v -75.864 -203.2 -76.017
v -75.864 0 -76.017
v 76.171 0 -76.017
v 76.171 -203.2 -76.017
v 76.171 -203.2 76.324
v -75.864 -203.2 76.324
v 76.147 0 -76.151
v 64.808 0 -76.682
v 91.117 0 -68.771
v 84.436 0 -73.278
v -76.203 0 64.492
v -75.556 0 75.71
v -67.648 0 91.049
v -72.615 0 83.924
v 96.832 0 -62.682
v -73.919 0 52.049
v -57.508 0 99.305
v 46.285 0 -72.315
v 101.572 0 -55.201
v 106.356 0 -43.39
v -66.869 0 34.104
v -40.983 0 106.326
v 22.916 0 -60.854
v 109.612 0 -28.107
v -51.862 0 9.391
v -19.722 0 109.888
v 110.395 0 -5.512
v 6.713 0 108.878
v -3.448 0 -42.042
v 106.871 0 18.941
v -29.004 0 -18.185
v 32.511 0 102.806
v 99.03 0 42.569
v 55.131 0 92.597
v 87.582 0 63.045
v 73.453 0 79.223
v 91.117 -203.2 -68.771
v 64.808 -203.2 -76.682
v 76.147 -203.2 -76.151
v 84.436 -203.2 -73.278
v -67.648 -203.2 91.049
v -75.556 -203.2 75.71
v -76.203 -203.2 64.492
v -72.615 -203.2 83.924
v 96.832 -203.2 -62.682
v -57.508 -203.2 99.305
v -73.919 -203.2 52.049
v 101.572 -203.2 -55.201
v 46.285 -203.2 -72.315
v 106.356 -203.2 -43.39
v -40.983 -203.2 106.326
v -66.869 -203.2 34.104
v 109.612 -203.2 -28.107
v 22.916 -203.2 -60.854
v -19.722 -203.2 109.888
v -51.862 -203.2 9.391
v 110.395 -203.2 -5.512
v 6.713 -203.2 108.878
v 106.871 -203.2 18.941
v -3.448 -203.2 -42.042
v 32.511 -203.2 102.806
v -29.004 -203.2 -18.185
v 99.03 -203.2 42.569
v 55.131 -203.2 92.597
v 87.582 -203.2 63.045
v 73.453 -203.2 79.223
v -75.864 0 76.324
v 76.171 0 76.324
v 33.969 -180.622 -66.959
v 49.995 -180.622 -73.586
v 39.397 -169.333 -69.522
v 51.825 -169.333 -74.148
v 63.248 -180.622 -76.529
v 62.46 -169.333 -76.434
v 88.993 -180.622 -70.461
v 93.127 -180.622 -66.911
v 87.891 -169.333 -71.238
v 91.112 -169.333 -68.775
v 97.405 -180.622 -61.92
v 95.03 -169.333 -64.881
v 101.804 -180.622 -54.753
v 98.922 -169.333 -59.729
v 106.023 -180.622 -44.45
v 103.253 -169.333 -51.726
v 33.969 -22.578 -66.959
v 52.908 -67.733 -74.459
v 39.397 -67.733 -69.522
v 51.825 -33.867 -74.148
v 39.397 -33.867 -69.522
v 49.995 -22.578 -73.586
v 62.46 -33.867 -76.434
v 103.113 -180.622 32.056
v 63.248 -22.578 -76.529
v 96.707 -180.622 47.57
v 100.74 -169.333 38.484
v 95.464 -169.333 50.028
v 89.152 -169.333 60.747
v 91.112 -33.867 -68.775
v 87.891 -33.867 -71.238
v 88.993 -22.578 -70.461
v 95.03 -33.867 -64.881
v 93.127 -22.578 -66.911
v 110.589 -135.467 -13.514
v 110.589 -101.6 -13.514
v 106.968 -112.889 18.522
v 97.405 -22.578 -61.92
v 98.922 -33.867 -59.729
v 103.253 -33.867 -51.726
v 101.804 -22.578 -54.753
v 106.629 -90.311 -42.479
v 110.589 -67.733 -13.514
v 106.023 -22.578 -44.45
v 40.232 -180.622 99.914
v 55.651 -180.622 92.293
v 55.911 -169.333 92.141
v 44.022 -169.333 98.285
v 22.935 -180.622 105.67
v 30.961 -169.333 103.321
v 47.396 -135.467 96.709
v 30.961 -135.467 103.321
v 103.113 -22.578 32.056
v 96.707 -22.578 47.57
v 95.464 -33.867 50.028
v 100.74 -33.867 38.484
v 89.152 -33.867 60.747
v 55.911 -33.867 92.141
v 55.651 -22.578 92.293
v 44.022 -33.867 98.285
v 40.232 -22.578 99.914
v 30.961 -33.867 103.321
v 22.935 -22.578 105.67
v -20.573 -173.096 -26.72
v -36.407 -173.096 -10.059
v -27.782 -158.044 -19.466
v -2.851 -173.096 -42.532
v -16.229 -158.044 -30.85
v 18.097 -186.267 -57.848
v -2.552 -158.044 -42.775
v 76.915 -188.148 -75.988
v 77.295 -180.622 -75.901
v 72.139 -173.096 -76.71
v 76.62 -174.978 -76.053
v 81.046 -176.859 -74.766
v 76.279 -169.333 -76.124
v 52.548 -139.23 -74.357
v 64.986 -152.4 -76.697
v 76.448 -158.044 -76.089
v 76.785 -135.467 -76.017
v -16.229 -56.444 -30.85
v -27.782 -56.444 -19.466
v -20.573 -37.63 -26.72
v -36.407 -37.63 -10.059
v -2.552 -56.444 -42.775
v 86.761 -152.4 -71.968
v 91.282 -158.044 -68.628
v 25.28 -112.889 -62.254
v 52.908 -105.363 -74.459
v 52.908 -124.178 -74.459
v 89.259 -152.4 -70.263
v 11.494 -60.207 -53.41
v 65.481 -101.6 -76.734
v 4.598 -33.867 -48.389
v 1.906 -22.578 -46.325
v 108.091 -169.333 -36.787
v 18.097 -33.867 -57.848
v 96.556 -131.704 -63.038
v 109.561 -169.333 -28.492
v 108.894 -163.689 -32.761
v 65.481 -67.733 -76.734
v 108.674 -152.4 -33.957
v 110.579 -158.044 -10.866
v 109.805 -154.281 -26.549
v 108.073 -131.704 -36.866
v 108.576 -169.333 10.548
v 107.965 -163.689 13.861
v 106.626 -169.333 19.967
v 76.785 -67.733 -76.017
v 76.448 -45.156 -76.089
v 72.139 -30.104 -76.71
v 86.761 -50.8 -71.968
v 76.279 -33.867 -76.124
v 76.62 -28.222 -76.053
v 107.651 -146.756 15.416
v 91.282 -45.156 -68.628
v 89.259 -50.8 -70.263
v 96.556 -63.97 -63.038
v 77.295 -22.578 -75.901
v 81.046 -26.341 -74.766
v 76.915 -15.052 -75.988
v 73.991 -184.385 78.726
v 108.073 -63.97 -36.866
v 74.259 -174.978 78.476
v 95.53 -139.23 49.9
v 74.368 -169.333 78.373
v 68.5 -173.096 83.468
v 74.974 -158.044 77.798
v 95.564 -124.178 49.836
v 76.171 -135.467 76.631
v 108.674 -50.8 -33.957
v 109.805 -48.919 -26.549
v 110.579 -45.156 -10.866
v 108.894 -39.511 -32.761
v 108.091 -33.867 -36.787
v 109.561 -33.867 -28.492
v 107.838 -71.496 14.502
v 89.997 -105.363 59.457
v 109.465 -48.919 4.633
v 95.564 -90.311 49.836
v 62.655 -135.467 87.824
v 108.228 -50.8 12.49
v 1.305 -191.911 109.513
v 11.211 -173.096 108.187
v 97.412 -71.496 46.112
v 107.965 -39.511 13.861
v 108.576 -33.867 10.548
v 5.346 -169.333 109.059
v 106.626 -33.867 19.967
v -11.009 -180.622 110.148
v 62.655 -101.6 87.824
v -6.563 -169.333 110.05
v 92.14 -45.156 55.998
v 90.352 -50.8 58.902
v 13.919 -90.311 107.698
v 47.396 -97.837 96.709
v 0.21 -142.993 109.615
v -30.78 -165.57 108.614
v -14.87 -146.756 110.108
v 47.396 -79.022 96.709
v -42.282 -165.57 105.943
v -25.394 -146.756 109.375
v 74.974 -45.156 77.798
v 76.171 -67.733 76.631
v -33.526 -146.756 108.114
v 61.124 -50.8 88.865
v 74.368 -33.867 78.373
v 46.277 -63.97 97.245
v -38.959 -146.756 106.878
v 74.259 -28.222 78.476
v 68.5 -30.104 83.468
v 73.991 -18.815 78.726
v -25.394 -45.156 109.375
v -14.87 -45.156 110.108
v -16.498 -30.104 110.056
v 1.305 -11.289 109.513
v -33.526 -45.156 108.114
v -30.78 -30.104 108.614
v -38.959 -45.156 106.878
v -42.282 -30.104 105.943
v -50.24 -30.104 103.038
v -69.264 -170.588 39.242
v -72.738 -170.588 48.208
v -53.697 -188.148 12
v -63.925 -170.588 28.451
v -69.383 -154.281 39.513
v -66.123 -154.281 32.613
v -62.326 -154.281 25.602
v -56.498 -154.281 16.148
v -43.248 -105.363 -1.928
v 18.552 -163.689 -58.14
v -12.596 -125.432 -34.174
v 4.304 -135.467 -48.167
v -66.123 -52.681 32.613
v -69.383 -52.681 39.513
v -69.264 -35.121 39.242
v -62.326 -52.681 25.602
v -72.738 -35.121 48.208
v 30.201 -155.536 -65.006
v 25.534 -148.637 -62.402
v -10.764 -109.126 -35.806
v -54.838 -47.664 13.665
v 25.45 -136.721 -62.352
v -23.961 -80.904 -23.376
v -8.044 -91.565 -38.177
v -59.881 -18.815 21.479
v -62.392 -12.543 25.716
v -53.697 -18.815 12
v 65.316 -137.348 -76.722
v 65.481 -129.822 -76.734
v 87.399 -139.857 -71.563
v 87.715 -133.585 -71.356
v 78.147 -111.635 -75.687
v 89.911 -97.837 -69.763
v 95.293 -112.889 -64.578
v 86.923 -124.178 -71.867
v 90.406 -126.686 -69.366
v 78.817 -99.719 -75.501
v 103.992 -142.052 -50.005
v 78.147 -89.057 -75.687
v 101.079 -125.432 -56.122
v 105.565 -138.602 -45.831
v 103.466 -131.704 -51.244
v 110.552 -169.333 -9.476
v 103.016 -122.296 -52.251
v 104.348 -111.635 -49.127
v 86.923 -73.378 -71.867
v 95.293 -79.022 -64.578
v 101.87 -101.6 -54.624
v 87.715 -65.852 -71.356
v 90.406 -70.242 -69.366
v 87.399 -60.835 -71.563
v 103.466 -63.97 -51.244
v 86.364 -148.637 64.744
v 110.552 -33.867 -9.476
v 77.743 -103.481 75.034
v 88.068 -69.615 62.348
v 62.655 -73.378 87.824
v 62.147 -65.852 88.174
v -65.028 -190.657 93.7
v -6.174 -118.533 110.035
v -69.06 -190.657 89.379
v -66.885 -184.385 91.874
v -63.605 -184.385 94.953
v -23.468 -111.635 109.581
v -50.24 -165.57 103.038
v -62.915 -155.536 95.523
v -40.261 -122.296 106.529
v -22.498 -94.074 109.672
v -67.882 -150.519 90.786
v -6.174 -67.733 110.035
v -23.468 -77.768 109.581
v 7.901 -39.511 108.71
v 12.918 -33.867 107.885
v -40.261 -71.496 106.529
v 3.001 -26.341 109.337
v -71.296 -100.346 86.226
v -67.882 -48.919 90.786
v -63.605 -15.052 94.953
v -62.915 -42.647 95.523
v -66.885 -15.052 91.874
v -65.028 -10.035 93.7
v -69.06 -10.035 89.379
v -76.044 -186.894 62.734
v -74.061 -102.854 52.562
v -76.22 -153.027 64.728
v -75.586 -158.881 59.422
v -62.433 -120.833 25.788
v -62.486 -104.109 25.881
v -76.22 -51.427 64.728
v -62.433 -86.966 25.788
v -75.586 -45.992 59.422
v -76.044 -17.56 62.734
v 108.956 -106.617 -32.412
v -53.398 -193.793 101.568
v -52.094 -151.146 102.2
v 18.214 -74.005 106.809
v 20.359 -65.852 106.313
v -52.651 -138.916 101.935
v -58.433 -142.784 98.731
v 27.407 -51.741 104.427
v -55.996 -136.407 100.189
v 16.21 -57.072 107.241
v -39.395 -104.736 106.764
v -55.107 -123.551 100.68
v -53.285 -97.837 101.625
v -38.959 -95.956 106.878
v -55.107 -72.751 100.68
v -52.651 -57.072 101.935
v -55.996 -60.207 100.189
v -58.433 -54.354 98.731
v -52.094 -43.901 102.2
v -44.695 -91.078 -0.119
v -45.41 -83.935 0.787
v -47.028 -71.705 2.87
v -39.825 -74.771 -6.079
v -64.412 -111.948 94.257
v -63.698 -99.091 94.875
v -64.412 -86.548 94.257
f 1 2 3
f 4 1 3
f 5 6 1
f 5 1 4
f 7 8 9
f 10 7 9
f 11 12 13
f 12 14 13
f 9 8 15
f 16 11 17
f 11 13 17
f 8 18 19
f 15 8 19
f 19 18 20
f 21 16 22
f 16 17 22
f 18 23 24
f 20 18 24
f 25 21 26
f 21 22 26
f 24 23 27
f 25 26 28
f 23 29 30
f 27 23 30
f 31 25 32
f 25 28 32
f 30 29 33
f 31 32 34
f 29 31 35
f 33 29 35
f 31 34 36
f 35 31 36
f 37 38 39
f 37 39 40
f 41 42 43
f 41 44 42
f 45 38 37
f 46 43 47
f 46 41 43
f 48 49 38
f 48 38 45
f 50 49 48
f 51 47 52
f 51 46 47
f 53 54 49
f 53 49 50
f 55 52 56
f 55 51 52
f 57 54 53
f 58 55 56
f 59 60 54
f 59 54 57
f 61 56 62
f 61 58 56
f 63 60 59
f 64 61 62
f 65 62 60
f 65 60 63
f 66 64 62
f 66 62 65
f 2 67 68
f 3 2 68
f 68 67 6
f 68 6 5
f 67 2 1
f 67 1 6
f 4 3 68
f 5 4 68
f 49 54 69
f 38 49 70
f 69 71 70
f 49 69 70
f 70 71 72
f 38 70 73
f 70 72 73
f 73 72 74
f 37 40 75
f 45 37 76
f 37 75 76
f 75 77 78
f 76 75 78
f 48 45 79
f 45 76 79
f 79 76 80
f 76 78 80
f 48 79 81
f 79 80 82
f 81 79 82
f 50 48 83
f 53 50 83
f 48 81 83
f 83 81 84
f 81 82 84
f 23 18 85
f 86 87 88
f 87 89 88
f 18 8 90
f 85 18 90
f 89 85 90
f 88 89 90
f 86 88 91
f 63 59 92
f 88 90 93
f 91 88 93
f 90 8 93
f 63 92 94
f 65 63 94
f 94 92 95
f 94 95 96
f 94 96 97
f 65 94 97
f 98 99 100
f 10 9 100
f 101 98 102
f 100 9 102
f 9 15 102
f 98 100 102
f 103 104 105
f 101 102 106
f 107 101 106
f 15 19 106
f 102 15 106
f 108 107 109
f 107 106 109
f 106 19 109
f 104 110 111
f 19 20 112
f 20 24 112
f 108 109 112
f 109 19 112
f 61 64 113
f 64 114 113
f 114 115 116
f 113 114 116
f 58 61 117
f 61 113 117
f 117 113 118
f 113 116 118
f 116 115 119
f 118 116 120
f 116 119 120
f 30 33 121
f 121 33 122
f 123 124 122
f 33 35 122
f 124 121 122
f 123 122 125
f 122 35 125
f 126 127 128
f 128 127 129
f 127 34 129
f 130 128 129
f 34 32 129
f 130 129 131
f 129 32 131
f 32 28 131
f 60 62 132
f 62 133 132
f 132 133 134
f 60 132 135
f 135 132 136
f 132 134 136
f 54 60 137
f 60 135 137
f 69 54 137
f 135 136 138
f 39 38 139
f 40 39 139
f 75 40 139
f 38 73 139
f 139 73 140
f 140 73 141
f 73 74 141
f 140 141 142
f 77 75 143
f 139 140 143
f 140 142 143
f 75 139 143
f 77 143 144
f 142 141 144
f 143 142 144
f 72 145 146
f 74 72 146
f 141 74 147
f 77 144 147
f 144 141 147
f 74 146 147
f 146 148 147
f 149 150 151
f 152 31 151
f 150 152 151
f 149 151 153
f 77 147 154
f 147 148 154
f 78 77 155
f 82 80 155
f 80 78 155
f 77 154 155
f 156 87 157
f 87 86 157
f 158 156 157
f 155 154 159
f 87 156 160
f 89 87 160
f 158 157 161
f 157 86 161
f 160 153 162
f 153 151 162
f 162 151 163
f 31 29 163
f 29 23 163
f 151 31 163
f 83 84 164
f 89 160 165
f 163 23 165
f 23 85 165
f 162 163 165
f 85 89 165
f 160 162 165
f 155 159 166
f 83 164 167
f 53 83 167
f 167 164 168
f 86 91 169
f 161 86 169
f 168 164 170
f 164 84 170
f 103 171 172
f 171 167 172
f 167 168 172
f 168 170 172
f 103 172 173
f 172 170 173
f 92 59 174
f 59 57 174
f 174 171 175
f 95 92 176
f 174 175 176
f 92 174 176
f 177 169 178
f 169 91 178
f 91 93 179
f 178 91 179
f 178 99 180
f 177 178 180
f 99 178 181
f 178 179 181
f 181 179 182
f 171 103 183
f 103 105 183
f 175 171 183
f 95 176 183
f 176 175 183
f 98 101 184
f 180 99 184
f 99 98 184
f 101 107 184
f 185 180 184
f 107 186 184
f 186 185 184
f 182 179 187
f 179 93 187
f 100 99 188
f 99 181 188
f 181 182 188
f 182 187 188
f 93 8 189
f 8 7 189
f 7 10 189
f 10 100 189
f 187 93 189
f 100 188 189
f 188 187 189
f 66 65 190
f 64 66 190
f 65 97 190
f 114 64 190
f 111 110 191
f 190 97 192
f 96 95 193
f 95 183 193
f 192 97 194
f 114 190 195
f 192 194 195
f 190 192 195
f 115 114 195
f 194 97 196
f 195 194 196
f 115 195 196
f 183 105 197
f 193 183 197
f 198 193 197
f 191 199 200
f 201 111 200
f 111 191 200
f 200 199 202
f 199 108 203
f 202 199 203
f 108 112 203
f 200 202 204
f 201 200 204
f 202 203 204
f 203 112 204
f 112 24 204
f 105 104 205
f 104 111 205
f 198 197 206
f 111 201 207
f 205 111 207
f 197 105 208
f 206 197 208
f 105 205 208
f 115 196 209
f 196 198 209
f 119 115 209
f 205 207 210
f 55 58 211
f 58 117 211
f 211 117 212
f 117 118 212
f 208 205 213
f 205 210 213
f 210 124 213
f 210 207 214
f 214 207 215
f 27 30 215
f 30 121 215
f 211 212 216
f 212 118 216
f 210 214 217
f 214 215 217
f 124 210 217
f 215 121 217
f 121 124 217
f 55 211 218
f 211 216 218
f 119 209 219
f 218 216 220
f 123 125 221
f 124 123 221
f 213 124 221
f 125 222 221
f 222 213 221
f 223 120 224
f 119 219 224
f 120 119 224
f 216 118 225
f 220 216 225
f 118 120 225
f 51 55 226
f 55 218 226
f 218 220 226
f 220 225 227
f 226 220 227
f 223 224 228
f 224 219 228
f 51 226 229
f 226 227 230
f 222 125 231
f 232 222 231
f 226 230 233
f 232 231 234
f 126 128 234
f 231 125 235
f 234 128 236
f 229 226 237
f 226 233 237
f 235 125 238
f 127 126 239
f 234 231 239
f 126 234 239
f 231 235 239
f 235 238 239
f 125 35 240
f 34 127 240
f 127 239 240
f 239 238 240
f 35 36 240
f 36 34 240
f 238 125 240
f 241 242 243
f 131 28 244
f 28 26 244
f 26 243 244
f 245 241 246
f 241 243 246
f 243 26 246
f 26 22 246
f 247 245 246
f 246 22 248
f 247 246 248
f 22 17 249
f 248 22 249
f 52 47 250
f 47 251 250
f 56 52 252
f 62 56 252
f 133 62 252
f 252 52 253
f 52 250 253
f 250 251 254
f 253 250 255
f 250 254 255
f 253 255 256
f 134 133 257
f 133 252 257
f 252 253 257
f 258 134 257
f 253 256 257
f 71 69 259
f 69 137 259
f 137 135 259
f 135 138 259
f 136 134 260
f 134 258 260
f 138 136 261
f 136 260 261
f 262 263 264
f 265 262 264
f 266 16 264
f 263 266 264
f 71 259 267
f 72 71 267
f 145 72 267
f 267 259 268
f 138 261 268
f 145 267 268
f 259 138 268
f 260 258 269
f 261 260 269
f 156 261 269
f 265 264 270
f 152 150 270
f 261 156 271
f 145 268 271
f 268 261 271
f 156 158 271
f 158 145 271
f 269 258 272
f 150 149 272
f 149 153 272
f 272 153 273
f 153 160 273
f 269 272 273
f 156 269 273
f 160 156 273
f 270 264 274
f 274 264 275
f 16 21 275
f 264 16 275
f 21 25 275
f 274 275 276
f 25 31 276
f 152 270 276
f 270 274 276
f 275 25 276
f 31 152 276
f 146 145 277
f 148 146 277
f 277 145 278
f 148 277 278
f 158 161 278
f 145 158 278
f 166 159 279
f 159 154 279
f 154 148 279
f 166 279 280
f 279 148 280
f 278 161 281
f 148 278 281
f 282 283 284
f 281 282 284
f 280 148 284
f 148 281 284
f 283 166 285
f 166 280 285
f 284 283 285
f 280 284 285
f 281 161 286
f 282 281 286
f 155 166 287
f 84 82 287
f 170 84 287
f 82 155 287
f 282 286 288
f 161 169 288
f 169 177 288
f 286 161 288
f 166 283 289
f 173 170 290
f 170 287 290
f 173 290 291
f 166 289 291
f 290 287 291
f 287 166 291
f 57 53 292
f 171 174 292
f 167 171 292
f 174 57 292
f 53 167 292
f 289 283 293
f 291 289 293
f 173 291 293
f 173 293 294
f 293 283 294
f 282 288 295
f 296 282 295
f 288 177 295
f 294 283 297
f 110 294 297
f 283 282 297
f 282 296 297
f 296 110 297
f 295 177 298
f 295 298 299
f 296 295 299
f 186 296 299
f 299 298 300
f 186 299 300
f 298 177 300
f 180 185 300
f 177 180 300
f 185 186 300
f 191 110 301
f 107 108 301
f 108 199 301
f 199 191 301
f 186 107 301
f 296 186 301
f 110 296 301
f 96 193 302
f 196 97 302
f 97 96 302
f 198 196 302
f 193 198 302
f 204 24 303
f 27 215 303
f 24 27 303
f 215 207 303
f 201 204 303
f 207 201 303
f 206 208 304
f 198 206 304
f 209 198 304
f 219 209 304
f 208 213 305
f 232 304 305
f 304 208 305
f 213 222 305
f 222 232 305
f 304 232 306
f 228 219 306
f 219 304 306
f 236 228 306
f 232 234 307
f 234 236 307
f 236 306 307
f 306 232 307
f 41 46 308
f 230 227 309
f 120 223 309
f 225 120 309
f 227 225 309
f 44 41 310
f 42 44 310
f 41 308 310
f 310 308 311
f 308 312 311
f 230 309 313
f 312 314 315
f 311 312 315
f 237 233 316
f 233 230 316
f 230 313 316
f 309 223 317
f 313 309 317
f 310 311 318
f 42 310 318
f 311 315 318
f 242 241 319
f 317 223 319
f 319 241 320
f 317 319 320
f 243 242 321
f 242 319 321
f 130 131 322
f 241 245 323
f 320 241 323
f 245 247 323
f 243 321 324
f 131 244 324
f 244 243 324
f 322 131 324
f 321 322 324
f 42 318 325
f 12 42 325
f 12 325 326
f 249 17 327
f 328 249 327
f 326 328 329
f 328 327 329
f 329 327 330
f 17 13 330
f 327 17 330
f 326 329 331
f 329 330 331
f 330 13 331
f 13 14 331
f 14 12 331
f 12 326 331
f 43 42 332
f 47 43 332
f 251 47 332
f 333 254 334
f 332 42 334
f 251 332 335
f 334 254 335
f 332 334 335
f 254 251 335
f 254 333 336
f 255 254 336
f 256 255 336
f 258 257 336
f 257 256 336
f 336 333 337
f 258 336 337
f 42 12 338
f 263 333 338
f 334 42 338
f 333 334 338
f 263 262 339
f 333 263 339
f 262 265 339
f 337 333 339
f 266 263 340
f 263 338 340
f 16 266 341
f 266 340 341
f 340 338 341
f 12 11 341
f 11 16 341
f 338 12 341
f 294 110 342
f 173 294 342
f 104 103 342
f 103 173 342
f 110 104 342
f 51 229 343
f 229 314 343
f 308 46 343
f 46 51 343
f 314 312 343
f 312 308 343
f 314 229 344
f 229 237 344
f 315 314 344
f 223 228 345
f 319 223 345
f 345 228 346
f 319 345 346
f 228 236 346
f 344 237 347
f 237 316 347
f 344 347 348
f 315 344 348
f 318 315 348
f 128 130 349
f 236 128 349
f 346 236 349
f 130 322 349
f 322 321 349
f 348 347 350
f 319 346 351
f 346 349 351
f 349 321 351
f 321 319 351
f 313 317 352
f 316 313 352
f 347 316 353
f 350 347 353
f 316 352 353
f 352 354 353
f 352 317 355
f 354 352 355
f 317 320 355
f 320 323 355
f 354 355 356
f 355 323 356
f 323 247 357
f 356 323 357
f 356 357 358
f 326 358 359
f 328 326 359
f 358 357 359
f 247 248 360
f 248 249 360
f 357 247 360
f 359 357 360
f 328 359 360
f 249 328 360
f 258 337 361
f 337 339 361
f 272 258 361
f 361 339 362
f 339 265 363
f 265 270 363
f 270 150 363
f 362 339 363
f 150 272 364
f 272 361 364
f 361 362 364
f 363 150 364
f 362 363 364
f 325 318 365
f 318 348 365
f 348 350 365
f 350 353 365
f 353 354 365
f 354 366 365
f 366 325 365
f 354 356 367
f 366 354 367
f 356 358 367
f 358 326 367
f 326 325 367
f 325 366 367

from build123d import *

# Parameters (mm, degrees)
F0_W     = 152.0343571901
F0_H     = 152.3414999247
F2_DEPTH = 203.2


with BuildPart() as f2:
    # F0 (on Front) → F2 (new body)
    with BuildSketch(Plane.XZ):
        with Locations((0.1535713673, 0.1535713673)):
            Rectangle(F0_W, F0_H)
    extrude(amount=F2_DEPTH)


with BuildPart() as f2b:
    # F1 (on face) → F2, piece 2 (new body)
    with BuildSketch(Plane.XZ):
        with BuildLine():
            add(Edge.make_bspline(
                [(-75.5564644933, 75.7100358605), (-86.6668516936, 23.1423527036), (118.174936648, -180.7554096371), (125.3172743548, 126.2112959556), (-66.2231449888, 119.869701376), (-75.5564644933, 75.7100358605)],
                knots=[0, 0, 0, 0, 0.3727658013, 0.686856789, 1, 1, 1, 1], degree=3))
        make_face()
    extrude(amount=F2_DEPTH)


solid = Compound([f2.part, f2b.part])
